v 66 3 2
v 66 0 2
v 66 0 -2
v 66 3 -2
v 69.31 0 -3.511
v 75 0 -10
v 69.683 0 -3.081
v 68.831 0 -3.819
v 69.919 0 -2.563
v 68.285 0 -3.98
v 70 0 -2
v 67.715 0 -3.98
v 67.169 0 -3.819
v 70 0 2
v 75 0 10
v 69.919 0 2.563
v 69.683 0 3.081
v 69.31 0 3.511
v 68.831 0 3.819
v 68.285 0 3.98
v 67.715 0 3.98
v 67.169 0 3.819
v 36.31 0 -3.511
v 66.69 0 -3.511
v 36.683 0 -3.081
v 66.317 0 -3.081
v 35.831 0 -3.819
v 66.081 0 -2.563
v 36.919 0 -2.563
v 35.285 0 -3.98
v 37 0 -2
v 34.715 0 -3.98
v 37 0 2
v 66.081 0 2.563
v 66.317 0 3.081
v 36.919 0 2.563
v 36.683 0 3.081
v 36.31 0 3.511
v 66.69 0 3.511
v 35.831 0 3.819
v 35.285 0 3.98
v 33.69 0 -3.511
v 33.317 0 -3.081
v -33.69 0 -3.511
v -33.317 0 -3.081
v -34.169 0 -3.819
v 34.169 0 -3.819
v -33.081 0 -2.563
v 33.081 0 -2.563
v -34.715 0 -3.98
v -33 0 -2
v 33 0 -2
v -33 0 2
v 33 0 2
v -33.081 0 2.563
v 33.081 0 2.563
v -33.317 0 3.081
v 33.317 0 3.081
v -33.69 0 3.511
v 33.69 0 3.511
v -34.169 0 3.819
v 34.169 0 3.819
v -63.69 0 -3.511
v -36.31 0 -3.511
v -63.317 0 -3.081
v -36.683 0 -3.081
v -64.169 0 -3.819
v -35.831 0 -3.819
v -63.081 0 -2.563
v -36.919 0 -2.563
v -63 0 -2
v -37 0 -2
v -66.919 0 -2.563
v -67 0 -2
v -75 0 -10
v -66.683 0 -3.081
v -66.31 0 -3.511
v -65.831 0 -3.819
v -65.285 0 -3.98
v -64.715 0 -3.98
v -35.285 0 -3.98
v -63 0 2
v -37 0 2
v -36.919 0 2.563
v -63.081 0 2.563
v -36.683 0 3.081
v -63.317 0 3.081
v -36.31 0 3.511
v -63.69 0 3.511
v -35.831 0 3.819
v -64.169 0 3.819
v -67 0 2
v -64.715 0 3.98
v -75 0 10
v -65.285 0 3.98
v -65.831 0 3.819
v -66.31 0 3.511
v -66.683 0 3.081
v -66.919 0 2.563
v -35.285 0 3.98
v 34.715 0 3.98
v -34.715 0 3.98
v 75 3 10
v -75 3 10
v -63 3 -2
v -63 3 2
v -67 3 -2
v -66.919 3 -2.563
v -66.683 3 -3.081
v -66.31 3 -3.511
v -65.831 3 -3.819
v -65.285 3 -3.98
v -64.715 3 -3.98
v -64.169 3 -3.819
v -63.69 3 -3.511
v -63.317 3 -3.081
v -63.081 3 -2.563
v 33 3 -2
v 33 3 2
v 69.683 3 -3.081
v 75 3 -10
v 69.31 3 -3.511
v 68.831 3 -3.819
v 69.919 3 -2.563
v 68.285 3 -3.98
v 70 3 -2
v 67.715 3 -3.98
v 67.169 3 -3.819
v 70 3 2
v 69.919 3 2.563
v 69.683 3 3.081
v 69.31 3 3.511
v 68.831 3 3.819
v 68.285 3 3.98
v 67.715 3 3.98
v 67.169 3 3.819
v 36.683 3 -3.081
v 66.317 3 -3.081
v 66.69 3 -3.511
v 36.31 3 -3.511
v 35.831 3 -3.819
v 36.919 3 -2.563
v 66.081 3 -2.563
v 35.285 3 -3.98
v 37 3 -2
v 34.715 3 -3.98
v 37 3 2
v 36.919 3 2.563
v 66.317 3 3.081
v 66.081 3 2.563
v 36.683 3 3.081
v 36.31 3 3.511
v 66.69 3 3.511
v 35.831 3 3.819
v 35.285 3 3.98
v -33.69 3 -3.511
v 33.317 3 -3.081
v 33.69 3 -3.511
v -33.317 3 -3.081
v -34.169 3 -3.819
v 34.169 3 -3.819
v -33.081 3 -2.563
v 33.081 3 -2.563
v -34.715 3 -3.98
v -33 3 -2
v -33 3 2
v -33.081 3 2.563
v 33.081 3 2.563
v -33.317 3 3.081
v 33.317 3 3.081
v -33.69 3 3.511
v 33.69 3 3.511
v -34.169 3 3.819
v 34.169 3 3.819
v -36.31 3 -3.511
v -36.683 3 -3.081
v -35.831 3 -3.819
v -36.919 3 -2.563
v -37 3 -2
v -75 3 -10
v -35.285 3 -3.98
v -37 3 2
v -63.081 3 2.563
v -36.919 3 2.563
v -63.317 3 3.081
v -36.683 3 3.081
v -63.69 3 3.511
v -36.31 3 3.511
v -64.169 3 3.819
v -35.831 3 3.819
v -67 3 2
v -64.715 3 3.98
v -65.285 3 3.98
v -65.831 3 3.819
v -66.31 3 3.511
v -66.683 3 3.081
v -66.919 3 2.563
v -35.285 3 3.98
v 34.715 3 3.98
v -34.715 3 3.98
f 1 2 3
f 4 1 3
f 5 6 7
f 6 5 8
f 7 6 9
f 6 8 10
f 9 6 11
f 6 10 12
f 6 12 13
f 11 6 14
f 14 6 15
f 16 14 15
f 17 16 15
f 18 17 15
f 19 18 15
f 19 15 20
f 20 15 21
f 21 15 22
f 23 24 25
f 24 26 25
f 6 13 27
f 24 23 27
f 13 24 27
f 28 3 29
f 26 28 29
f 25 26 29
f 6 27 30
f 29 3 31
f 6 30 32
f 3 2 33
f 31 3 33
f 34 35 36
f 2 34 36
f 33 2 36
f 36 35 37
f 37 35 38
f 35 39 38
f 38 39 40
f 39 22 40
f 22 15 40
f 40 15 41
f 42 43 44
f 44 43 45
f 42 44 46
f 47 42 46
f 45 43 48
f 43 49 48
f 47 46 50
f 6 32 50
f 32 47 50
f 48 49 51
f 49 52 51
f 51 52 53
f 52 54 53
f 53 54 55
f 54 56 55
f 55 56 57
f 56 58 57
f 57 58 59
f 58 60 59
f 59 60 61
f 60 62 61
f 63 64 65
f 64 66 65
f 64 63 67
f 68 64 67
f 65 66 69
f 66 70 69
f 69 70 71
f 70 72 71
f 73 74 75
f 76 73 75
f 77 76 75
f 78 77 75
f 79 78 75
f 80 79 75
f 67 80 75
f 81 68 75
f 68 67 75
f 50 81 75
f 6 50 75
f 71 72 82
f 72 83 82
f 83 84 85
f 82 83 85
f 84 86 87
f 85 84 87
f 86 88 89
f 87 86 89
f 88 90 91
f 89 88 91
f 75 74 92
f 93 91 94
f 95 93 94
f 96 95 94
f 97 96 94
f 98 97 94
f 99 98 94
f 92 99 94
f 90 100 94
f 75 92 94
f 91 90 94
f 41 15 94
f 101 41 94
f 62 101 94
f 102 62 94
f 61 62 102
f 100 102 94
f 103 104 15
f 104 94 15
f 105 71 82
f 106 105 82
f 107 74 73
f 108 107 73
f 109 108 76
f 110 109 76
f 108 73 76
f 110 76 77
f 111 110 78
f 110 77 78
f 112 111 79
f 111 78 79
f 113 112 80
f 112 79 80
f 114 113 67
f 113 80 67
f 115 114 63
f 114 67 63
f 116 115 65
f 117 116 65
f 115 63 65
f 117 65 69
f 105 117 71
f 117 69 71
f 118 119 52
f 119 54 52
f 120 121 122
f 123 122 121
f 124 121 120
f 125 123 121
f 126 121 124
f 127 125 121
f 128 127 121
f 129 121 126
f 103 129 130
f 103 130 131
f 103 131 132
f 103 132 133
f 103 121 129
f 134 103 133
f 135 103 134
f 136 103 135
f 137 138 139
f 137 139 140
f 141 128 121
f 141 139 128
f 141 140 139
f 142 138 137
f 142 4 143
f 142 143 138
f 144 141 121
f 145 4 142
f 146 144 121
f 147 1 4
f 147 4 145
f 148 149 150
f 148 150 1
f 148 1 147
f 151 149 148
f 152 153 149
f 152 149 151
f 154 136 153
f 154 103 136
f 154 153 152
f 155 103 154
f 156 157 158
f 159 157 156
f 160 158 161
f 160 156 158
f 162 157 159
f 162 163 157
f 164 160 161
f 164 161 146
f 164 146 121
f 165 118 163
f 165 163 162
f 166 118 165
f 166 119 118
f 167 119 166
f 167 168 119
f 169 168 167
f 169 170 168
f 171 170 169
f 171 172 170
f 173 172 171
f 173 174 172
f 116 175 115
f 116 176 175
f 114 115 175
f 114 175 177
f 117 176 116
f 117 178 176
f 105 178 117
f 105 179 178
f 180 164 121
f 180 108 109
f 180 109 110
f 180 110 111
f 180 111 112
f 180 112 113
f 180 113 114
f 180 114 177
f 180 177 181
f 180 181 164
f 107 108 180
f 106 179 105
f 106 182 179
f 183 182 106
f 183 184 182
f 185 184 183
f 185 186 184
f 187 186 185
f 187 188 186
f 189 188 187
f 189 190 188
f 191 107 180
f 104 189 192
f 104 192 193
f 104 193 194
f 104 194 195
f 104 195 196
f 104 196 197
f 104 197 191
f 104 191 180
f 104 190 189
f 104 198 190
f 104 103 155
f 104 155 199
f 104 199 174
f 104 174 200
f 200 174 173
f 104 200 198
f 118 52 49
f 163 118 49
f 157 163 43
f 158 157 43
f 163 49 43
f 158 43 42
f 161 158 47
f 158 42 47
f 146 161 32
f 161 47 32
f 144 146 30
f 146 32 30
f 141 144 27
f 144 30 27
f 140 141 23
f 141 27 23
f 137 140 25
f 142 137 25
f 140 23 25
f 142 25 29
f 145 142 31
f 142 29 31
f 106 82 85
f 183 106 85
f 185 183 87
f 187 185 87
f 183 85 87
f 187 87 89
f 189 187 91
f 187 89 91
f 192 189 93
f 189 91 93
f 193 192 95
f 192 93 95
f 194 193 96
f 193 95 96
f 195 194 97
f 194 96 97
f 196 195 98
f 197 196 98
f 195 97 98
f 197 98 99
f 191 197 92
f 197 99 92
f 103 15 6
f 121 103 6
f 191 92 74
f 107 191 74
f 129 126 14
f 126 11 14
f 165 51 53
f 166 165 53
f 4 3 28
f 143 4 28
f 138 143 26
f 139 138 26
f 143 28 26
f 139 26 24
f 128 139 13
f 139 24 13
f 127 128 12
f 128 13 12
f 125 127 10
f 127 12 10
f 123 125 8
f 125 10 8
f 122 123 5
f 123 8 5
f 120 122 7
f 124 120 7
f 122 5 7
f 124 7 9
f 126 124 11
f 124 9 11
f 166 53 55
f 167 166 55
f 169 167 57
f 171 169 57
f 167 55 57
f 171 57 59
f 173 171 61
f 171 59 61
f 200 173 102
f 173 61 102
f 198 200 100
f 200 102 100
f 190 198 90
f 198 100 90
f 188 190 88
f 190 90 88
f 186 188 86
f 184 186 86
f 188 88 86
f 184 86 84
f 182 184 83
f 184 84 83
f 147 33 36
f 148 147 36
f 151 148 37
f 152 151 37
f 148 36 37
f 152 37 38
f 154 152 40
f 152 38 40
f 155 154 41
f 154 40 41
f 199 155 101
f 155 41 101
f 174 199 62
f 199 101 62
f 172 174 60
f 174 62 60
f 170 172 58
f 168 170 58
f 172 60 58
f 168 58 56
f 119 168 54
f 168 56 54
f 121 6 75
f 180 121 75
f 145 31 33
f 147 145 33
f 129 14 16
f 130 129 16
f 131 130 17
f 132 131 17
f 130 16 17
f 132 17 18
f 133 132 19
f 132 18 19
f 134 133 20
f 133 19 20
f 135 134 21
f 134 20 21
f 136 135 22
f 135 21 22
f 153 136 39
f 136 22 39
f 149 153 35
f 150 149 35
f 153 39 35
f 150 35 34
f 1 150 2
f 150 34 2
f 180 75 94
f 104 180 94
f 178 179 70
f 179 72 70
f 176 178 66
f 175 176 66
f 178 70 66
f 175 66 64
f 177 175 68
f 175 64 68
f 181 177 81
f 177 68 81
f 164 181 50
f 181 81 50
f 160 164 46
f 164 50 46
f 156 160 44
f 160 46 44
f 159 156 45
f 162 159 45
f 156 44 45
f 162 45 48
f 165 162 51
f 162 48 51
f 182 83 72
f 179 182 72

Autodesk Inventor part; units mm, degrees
ref_plane "YZ Plane" through (0, 0, 0) normal (1, 0, 0) x (0, 1, 0)
ref_plane "XZ Plane" through (0, 0, 0) normal (0, 1, 0) x (-1, 0, 0)
ref_plane "XY Plane" through (0, 0, 0) normal (0, 0, 1) x (1, 0, 0)
sketch "스케치1" plane through (0, 0, 0) normal (0, 1, 0) x (-1, 0, 0)
  line L0 (75, 10) -> (-75, 10)
  line L1 (-75, 10) -> (-75, -10)
  line L2 (-75, -10) -> (75, -10)
  line L3 (75, -10) -> (75, 10)
  line L4 (75, 10) -> (-75, -10) construction
  line L5 (-75, 10) -> (75, -10) construction
  circle A0 centre (35, 0) radius 2.25
  line L6 (105, 0) -> (-105, 0) projected
  circle A1 centre (-35, 0) radius 2.25
  point P0 (0, 0)
  point P1 (-75, 0)
  dimension "d0" = 150
  dimension "d1" = 20
  dimension "d4" = 4.5
  dimension "d5" = 40
  dimension "d6" = 4.5
  dimension "d7" = 40
extrude "돌출1" add sketch "스케치1" along normal blind 3
sketch "스케치4" plane through (0, 0, 0) normal (0, -1, 0) x (1, 0, 0)
  line L0 (-35, -2) -> (-35, 2) construction
  line L1 (-33, -2) -> (-33, 2)
  line L2 (-37, 2) -> (-37, -2)
  arc A0 (-37, -2) -> (-33, -2) centre (-35, -2) ccw
  arc A1 (-33, 2) -> (-37, 2) centre (-35, 2) ccw
  line L3 (35, -2) -> (35, 2) construction
  line L4 (37, -2) -> (37, 2)
  line L5 (33, 2) -> (33, -2)
  arc A2 (33, -2) -> (37, -2) centre (35, -2) ccw
  arc A3 (37, 2) -> (33, 2) centre (35, 2) ccw
  line L6 (-75, 10) -> (75, 10) projected
  line L7 (75, 10) -> (75, -10) projected
  line L8 (-75, -10) -> (-75, 10) projected
  line L9 (75, -10) -> (-75, -10) projected
  line L10 (68, 2) -> (68, -2) construction
  line L11 (66, 2) -> (66, -2)
  line L12 (70, -2) -> (70, 2)
  arc A4 (70, 2) -> (66, 2) centre (68, 2) ccw
  arc A5 (66, -2) -> (70, -2) centre (68, -2) ccw
  line L13 (-65, -2) -> (-65, 2) construction
  line L14 (-63, -2) -> (-63, 2)
  line L15 (-67, 2) -> (-67, -2)
  arc A6 (-67, -2) -> (-63, -2) centre (-65, -2) ccw
  arc A7 (-63, 2) -> (-67, 2) centre (-65, 2) ccw
  point P0 (-35, 0)
  point P1 (35, 0)
  point P2 (68, 0)
  point P3 (-65, 0)
  point P4 (75, 0)
  point P5 (75, 0)
  point P6 (-75, 0)
  point P7 (-75, 0)
  dimension "d14" = 4
  dimension "d15" = 4
  dimension "d16" = 4
  dimension "d17" = 4
  dimension "d18" = 10
  dimension "d19" = 40
  dimension "d20" = 10
  dimension "d21" = 40
  dimension "d28" = 4
  dimension "d29" = 4
  dimension "d30" = 4
  dimension "d31" = 4
  dimension "d32" = 0
  dimension "d33" = 7
  dimension "d34" = 0
  dimension "d35" = 10
extrude "돌출3" cut sketch "스케치4" against normal blind 10 contours A0 L2 A1 L1 | A2 L5 A3 L4 | A4 L12 A5 L11 | A6 L15 A7 L14
properties part number "발받침대위,아래"
